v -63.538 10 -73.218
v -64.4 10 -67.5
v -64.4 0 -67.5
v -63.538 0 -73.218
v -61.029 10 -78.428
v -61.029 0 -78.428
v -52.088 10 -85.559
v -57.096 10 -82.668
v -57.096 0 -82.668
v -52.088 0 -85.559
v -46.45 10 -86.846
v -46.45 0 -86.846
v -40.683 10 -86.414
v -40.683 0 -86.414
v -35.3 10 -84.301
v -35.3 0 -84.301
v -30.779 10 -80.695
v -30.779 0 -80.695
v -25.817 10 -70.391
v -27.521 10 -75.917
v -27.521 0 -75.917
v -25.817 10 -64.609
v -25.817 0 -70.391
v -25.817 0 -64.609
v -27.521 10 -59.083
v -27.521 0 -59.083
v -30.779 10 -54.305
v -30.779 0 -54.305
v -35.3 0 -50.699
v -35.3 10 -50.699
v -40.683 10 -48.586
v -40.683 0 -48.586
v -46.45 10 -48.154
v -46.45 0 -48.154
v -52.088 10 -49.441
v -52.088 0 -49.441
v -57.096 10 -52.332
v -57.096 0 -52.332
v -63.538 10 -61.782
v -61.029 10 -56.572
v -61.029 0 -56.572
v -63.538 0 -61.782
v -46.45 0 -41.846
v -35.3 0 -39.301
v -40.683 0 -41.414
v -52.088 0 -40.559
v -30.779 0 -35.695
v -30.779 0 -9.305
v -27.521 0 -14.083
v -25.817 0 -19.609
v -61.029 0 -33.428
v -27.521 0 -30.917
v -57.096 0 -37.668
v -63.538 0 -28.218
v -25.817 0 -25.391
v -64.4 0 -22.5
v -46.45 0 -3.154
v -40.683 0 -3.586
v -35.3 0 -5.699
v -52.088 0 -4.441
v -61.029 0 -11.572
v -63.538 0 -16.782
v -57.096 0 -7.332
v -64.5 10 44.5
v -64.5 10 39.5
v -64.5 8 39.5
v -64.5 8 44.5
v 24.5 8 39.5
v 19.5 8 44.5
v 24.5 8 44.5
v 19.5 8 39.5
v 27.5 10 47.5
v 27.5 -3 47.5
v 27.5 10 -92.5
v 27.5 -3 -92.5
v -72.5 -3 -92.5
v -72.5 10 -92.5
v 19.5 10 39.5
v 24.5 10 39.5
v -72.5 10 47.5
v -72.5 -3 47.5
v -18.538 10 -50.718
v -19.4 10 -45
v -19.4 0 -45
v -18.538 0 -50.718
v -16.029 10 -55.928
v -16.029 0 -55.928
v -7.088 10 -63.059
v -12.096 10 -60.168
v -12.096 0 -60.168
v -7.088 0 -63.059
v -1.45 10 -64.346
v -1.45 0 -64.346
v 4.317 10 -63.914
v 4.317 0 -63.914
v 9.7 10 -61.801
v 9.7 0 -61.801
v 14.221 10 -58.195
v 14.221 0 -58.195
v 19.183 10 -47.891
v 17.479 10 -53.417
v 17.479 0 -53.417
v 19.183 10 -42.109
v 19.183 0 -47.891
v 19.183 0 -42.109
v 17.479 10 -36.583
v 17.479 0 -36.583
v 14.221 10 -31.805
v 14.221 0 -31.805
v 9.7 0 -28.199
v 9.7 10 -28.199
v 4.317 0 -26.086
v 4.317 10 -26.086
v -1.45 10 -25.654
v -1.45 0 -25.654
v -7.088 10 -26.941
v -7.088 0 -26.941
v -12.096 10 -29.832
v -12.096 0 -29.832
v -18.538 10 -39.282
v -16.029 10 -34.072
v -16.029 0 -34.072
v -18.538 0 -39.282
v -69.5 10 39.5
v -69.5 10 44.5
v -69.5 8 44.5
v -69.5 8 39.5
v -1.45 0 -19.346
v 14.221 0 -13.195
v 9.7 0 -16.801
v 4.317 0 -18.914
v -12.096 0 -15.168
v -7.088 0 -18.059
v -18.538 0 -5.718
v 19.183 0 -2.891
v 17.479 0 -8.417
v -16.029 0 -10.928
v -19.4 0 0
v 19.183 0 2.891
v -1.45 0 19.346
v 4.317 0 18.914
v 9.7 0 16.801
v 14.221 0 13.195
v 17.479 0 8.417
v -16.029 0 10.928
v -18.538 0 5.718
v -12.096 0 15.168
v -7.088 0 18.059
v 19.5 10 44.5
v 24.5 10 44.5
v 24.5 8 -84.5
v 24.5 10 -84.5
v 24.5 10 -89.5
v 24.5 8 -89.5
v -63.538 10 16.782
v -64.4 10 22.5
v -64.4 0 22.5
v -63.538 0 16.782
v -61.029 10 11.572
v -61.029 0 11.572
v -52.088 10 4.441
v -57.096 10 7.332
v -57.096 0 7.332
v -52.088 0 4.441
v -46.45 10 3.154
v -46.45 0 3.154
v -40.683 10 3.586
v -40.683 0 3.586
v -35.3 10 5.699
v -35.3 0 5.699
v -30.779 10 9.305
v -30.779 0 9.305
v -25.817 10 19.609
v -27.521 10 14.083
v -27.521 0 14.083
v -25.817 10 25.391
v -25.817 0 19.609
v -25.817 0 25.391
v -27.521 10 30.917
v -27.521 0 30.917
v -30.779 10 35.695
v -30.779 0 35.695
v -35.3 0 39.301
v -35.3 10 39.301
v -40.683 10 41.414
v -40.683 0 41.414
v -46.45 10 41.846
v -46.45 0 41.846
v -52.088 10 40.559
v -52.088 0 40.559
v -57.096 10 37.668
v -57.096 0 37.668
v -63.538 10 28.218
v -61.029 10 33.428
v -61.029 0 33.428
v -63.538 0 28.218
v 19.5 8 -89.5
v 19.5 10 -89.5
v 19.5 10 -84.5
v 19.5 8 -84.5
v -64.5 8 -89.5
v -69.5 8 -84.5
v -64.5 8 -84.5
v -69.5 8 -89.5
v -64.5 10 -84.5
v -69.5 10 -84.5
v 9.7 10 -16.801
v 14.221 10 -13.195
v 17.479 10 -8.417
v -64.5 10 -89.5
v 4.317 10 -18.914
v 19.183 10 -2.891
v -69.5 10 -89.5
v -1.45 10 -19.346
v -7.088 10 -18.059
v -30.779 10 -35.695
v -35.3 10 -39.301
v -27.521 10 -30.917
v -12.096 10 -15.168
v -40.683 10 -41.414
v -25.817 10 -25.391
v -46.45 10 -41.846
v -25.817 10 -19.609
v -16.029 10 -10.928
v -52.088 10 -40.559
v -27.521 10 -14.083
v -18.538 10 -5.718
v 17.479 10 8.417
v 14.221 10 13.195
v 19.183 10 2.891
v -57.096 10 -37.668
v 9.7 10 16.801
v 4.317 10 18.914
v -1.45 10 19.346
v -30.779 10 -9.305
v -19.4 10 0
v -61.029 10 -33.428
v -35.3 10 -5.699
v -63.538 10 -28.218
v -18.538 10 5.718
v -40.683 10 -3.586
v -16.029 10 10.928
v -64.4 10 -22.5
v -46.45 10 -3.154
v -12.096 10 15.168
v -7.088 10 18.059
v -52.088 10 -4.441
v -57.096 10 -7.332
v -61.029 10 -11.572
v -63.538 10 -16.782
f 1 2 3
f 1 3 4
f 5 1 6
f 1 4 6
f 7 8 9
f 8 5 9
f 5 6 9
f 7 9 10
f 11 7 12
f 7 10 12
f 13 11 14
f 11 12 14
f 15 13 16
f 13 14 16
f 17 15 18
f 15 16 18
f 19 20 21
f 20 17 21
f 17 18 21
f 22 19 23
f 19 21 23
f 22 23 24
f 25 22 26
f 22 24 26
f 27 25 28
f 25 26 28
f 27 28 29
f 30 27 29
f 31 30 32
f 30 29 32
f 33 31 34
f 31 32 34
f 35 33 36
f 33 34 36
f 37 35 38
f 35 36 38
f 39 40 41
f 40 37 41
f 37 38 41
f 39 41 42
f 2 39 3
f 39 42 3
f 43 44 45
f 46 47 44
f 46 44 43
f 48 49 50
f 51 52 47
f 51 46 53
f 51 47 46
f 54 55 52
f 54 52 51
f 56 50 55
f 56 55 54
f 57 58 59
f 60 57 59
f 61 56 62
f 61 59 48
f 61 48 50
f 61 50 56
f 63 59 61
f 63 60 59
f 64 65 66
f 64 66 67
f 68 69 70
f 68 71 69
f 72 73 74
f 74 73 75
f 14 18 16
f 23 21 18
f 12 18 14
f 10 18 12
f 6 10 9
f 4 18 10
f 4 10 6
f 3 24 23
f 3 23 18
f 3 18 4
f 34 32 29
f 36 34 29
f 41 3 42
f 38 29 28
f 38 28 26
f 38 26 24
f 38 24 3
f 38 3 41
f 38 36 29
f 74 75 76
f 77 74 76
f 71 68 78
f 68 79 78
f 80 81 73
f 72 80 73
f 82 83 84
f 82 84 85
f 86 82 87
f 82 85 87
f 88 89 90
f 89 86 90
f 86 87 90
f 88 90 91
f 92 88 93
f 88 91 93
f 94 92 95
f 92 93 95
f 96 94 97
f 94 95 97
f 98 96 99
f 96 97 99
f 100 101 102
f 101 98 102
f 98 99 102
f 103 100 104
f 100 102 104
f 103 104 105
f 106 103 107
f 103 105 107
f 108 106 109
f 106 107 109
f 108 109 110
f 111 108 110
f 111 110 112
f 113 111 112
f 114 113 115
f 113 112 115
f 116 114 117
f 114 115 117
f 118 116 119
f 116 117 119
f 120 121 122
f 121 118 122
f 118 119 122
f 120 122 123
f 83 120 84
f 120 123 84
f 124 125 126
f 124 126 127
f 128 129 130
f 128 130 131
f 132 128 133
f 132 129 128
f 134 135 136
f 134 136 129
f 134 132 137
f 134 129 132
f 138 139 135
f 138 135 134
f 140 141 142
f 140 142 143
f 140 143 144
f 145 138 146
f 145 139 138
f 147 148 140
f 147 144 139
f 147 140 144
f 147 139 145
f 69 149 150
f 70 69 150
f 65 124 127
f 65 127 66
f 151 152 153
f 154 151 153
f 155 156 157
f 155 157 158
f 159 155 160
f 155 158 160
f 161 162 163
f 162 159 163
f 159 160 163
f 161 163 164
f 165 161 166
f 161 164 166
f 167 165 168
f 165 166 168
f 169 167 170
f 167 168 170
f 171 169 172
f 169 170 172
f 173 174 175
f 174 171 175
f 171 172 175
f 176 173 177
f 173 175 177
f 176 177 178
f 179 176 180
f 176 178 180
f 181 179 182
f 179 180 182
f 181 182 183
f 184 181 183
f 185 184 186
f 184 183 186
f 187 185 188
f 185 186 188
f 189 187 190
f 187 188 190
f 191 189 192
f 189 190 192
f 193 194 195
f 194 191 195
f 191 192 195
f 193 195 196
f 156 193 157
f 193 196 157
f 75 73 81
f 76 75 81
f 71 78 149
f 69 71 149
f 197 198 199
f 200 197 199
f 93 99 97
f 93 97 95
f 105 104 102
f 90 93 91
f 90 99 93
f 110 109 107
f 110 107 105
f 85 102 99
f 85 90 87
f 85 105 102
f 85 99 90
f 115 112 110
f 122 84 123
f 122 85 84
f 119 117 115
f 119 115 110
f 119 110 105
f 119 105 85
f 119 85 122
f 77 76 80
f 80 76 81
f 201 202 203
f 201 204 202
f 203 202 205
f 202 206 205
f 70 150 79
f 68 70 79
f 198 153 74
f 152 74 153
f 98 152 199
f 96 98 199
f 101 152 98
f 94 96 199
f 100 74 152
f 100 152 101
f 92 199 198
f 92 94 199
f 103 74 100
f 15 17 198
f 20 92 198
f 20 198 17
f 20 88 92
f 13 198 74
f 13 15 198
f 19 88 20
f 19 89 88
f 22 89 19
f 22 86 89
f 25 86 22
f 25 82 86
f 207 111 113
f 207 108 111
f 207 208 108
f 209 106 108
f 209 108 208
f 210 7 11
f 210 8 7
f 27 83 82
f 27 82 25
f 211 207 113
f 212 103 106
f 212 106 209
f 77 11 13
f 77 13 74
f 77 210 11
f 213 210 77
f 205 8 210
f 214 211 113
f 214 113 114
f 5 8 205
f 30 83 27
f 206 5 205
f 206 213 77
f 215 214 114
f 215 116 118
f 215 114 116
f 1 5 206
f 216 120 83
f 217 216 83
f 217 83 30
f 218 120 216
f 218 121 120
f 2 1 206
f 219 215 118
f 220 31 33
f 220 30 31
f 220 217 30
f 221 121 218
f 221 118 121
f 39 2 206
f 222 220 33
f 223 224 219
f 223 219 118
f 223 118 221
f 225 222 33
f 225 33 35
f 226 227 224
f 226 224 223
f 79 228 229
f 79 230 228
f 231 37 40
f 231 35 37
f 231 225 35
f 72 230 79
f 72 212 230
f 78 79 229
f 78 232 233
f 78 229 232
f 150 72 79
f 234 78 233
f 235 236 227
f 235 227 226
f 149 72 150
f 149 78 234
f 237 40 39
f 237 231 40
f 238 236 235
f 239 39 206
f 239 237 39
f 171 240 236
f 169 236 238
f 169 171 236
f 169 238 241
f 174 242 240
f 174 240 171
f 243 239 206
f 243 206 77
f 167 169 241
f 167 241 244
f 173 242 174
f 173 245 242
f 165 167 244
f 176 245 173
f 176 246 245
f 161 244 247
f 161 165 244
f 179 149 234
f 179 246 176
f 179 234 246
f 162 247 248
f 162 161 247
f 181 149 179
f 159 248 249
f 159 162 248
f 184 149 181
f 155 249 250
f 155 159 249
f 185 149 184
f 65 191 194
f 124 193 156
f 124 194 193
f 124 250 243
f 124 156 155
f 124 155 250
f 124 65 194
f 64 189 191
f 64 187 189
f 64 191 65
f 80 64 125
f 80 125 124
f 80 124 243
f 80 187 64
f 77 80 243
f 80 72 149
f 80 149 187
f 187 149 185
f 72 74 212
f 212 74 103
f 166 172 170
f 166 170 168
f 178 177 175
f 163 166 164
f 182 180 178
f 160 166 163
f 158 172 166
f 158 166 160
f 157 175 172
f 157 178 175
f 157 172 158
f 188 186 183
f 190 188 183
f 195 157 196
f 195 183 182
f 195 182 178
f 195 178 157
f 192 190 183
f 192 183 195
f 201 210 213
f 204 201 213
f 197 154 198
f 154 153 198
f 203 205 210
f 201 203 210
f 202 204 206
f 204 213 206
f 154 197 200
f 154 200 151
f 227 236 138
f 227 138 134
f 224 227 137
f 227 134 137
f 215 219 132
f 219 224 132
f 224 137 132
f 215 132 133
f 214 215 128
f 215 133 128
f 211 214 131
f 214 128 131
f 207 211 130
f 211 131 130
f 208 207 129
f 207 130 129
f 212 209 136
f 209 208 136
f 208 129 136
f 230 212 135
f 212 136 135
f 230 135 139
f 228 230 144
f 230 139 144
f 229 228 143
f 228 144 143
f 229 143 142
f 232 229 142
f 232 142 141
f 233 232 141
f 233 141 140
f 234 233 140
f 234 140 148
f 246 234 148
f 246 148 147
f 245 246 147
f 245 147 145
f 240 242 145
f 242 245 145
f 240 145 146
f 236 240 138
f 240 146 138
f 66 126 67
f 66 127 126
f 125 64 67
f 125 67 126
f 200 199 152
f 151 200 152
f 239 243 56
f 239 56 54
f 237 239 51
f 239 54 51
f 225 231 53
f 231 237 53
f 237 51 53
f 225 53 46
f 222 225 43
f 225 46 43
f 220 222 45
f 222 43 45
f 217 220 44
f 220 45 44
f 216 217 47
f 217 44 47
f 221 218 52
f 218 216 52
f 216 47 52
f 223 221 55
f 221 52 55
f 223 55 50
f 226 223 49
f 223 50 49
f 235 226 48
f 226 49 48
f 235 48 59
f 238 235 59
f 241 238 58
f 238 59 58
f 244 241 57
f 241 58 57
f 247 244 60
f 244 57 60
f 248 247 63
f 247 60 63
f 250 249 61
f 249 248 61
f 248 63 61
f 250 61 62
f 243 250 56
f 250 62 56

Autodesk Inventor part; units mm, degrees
ref_plane "YZ Plane" through (0, 0, 0) normal (1, 0, 0) x (0, 1, 0)
ref_plane "XZ Plane" through (0, 0, 0) normal (0, 1, 0) x (-1, 0, 0)
ref_plane "XY Plane" through (0, 0, 0) normal (0, 0, 1) x (1, 0, 0)
sketch "Sketch1" plane through (0, 0, 0) normal (0, 1, 0) x (-1, 0, 0)
  circle A0 centre (0, 0) radius 19.4
  line L0 (0, 0) -> (0, -10.9961) construction
  circle A1 centre (0, -45) radius 19.4
  circle A2 centre (45, 22.5) radius 19.4
  circle A3 centre (45, -22.5) radius 19.4
  circle A4 centre (45, -67.5) radius 19.4
  line L1 (-27.5, -92.5) -> (72.5, -92.5)
  line L2 (72.5, -92.5) -> (72.5, 47.5)
  line L3 (72.5, 47.5) -> (-27.5, 47.5)
  line L4 (-27.5, 47.5) -> (-27.5, -92.5)
  line L5 (-27.5, -92.5) -> (72.5, 47.5) construction
  line L6 (72.5, -92.5) -> (-27.5, 47.5) construction
  point P0 (22.5, -22.5)
  dimension "d0" = 38.8
  dimension "d3" = 45
  dimension "d8" = 38.8
  dimension "d9" = 45
  dimension "d10" = 22.5
  dimension "d13" = 45
  dimension "d18" = 22.5
  dimension "d19" = 50
  dimension "d20" = 70
  dimension "d21" = 22.5
extrude "Extrusion1" add sketch "Sketch1" along normal blind 10
extrude "Extrusion2" add sketch "Sketch1" against normal blind 3 contours A0 | A1 | A2 | A3 | A4 | L4 L3 L2 L1
sketch "Sketch3" plane through (0, 10, 0) normal (0, 1, 0) x (1, 0, 0)
  line L0 (24.5, 89.5) -> (19.5, 89.5)
  line L1 (19.5, 89.5) -> (19.5, 84.5)
  line L2 (19.5, 84.5) -> (24.5, 84.5)
  line L3 (24.5, 84.5) -> (24.5, 89.5)
  line L4 (24.5, -39.5) -> (19.5, -39.5)
  line L5 (19.5, -39.5) -> (19.5, -44.5)
  line L6 (19.5, -44.5) -> (24.5, -44.5)
  line L7 (24.5, -44.5) -> (24.5, -39.5)
  line L8 (-64.5, -44.5) -> (-69.5, -44.5)
  line L9 (-69.5, -44.5) -> (-69.5, -39.5)
  line L10 (-69.5, -39.5) -> (-64.5, -39.5)
  line L11 (-64.5, -39.5) -> (-64.5, -44.5)
  line L12 (-64.5, 89.5) -> (-69.5, 89.5)
  line L13 (-69.5, 89.5) -> (-69.5, 84.5)
  line L14 (-69.5, 84.5) -> (-64.5, 84.5)
  line L15 (-64.5, 84.5) -> (-64.5, 89.5)
  line L16 (27.5, -47.5) -> (27.5, 92.5) projected
  line L17 (27.5, 92.5) -> (-72.5, 92.5) projected
  line L18 (-72.5, -47.5) -> (27.5, -47.5) projected
  line L19 (-72.5, 92.5) -> (-72.5, -47.5) projected
  point P0 (0, 0)
  dimension "d26" = 5
  dimension "d27" = 3
  dimension "d28" = 3
  dimension "d29" = 5
  dimension "d30" = 3
  dimension "d31" = 3
  dimension "d32" = 5
  dimension "d33" = 3
  dimension "d34" = 5
extrude "Extrusion3" cut sketch "Sketch3" against normal blind 2 contours L3 L2 L1 L0 | L7 L6 L5 L4 | L8 L9 L10 L11 | L15 L14 L13 L12
equation "\"d0\" = bottleDiameter"
equation "\"d3\" = bottleDistance"
equation "\"d8\" = bottleDiameter"
equation "\"d9\" = bottleDistance"
equation "\"d10\" = 0.5 * bottleDistance"
equation "\"d13\" = bottleDistance"
equation "\"d18\" = 0.5 * bottleDistance"
equation "\"d21\" = 0.5 * bottleDistance"
equation "\"capDiameter\" = 29.5"
equation "\"bottleLen\" = 81.3"
equation "\"bottleDiameter\" = 38.8"
equation "\"tubeInsideDiameter\" = 2"
equation "\"tubeOutsideDiameter\" = 5.4"
equation "\"tick\" = 2"
equation "\"connectorDiameter\" = 35"
equation "\"connectorInsideDiameter\" = tubeInsideDiameter - tick"
equation "\"connectorTubeDepth\" = 18.5"
equation "\"tubeFlapDepth\" = 3"
equation "\"tubeFlapAngle\" = 15deg"
equation "\"minTick\" = 0.25"
equation "\"tubeLinkTick\" = 2"
equation "\"tubeTolerance\" = 0.3"
equation "\"tickHolder\" = 1"
equation "\"bottleDistance\" = 45"
properties part number "trayB"
